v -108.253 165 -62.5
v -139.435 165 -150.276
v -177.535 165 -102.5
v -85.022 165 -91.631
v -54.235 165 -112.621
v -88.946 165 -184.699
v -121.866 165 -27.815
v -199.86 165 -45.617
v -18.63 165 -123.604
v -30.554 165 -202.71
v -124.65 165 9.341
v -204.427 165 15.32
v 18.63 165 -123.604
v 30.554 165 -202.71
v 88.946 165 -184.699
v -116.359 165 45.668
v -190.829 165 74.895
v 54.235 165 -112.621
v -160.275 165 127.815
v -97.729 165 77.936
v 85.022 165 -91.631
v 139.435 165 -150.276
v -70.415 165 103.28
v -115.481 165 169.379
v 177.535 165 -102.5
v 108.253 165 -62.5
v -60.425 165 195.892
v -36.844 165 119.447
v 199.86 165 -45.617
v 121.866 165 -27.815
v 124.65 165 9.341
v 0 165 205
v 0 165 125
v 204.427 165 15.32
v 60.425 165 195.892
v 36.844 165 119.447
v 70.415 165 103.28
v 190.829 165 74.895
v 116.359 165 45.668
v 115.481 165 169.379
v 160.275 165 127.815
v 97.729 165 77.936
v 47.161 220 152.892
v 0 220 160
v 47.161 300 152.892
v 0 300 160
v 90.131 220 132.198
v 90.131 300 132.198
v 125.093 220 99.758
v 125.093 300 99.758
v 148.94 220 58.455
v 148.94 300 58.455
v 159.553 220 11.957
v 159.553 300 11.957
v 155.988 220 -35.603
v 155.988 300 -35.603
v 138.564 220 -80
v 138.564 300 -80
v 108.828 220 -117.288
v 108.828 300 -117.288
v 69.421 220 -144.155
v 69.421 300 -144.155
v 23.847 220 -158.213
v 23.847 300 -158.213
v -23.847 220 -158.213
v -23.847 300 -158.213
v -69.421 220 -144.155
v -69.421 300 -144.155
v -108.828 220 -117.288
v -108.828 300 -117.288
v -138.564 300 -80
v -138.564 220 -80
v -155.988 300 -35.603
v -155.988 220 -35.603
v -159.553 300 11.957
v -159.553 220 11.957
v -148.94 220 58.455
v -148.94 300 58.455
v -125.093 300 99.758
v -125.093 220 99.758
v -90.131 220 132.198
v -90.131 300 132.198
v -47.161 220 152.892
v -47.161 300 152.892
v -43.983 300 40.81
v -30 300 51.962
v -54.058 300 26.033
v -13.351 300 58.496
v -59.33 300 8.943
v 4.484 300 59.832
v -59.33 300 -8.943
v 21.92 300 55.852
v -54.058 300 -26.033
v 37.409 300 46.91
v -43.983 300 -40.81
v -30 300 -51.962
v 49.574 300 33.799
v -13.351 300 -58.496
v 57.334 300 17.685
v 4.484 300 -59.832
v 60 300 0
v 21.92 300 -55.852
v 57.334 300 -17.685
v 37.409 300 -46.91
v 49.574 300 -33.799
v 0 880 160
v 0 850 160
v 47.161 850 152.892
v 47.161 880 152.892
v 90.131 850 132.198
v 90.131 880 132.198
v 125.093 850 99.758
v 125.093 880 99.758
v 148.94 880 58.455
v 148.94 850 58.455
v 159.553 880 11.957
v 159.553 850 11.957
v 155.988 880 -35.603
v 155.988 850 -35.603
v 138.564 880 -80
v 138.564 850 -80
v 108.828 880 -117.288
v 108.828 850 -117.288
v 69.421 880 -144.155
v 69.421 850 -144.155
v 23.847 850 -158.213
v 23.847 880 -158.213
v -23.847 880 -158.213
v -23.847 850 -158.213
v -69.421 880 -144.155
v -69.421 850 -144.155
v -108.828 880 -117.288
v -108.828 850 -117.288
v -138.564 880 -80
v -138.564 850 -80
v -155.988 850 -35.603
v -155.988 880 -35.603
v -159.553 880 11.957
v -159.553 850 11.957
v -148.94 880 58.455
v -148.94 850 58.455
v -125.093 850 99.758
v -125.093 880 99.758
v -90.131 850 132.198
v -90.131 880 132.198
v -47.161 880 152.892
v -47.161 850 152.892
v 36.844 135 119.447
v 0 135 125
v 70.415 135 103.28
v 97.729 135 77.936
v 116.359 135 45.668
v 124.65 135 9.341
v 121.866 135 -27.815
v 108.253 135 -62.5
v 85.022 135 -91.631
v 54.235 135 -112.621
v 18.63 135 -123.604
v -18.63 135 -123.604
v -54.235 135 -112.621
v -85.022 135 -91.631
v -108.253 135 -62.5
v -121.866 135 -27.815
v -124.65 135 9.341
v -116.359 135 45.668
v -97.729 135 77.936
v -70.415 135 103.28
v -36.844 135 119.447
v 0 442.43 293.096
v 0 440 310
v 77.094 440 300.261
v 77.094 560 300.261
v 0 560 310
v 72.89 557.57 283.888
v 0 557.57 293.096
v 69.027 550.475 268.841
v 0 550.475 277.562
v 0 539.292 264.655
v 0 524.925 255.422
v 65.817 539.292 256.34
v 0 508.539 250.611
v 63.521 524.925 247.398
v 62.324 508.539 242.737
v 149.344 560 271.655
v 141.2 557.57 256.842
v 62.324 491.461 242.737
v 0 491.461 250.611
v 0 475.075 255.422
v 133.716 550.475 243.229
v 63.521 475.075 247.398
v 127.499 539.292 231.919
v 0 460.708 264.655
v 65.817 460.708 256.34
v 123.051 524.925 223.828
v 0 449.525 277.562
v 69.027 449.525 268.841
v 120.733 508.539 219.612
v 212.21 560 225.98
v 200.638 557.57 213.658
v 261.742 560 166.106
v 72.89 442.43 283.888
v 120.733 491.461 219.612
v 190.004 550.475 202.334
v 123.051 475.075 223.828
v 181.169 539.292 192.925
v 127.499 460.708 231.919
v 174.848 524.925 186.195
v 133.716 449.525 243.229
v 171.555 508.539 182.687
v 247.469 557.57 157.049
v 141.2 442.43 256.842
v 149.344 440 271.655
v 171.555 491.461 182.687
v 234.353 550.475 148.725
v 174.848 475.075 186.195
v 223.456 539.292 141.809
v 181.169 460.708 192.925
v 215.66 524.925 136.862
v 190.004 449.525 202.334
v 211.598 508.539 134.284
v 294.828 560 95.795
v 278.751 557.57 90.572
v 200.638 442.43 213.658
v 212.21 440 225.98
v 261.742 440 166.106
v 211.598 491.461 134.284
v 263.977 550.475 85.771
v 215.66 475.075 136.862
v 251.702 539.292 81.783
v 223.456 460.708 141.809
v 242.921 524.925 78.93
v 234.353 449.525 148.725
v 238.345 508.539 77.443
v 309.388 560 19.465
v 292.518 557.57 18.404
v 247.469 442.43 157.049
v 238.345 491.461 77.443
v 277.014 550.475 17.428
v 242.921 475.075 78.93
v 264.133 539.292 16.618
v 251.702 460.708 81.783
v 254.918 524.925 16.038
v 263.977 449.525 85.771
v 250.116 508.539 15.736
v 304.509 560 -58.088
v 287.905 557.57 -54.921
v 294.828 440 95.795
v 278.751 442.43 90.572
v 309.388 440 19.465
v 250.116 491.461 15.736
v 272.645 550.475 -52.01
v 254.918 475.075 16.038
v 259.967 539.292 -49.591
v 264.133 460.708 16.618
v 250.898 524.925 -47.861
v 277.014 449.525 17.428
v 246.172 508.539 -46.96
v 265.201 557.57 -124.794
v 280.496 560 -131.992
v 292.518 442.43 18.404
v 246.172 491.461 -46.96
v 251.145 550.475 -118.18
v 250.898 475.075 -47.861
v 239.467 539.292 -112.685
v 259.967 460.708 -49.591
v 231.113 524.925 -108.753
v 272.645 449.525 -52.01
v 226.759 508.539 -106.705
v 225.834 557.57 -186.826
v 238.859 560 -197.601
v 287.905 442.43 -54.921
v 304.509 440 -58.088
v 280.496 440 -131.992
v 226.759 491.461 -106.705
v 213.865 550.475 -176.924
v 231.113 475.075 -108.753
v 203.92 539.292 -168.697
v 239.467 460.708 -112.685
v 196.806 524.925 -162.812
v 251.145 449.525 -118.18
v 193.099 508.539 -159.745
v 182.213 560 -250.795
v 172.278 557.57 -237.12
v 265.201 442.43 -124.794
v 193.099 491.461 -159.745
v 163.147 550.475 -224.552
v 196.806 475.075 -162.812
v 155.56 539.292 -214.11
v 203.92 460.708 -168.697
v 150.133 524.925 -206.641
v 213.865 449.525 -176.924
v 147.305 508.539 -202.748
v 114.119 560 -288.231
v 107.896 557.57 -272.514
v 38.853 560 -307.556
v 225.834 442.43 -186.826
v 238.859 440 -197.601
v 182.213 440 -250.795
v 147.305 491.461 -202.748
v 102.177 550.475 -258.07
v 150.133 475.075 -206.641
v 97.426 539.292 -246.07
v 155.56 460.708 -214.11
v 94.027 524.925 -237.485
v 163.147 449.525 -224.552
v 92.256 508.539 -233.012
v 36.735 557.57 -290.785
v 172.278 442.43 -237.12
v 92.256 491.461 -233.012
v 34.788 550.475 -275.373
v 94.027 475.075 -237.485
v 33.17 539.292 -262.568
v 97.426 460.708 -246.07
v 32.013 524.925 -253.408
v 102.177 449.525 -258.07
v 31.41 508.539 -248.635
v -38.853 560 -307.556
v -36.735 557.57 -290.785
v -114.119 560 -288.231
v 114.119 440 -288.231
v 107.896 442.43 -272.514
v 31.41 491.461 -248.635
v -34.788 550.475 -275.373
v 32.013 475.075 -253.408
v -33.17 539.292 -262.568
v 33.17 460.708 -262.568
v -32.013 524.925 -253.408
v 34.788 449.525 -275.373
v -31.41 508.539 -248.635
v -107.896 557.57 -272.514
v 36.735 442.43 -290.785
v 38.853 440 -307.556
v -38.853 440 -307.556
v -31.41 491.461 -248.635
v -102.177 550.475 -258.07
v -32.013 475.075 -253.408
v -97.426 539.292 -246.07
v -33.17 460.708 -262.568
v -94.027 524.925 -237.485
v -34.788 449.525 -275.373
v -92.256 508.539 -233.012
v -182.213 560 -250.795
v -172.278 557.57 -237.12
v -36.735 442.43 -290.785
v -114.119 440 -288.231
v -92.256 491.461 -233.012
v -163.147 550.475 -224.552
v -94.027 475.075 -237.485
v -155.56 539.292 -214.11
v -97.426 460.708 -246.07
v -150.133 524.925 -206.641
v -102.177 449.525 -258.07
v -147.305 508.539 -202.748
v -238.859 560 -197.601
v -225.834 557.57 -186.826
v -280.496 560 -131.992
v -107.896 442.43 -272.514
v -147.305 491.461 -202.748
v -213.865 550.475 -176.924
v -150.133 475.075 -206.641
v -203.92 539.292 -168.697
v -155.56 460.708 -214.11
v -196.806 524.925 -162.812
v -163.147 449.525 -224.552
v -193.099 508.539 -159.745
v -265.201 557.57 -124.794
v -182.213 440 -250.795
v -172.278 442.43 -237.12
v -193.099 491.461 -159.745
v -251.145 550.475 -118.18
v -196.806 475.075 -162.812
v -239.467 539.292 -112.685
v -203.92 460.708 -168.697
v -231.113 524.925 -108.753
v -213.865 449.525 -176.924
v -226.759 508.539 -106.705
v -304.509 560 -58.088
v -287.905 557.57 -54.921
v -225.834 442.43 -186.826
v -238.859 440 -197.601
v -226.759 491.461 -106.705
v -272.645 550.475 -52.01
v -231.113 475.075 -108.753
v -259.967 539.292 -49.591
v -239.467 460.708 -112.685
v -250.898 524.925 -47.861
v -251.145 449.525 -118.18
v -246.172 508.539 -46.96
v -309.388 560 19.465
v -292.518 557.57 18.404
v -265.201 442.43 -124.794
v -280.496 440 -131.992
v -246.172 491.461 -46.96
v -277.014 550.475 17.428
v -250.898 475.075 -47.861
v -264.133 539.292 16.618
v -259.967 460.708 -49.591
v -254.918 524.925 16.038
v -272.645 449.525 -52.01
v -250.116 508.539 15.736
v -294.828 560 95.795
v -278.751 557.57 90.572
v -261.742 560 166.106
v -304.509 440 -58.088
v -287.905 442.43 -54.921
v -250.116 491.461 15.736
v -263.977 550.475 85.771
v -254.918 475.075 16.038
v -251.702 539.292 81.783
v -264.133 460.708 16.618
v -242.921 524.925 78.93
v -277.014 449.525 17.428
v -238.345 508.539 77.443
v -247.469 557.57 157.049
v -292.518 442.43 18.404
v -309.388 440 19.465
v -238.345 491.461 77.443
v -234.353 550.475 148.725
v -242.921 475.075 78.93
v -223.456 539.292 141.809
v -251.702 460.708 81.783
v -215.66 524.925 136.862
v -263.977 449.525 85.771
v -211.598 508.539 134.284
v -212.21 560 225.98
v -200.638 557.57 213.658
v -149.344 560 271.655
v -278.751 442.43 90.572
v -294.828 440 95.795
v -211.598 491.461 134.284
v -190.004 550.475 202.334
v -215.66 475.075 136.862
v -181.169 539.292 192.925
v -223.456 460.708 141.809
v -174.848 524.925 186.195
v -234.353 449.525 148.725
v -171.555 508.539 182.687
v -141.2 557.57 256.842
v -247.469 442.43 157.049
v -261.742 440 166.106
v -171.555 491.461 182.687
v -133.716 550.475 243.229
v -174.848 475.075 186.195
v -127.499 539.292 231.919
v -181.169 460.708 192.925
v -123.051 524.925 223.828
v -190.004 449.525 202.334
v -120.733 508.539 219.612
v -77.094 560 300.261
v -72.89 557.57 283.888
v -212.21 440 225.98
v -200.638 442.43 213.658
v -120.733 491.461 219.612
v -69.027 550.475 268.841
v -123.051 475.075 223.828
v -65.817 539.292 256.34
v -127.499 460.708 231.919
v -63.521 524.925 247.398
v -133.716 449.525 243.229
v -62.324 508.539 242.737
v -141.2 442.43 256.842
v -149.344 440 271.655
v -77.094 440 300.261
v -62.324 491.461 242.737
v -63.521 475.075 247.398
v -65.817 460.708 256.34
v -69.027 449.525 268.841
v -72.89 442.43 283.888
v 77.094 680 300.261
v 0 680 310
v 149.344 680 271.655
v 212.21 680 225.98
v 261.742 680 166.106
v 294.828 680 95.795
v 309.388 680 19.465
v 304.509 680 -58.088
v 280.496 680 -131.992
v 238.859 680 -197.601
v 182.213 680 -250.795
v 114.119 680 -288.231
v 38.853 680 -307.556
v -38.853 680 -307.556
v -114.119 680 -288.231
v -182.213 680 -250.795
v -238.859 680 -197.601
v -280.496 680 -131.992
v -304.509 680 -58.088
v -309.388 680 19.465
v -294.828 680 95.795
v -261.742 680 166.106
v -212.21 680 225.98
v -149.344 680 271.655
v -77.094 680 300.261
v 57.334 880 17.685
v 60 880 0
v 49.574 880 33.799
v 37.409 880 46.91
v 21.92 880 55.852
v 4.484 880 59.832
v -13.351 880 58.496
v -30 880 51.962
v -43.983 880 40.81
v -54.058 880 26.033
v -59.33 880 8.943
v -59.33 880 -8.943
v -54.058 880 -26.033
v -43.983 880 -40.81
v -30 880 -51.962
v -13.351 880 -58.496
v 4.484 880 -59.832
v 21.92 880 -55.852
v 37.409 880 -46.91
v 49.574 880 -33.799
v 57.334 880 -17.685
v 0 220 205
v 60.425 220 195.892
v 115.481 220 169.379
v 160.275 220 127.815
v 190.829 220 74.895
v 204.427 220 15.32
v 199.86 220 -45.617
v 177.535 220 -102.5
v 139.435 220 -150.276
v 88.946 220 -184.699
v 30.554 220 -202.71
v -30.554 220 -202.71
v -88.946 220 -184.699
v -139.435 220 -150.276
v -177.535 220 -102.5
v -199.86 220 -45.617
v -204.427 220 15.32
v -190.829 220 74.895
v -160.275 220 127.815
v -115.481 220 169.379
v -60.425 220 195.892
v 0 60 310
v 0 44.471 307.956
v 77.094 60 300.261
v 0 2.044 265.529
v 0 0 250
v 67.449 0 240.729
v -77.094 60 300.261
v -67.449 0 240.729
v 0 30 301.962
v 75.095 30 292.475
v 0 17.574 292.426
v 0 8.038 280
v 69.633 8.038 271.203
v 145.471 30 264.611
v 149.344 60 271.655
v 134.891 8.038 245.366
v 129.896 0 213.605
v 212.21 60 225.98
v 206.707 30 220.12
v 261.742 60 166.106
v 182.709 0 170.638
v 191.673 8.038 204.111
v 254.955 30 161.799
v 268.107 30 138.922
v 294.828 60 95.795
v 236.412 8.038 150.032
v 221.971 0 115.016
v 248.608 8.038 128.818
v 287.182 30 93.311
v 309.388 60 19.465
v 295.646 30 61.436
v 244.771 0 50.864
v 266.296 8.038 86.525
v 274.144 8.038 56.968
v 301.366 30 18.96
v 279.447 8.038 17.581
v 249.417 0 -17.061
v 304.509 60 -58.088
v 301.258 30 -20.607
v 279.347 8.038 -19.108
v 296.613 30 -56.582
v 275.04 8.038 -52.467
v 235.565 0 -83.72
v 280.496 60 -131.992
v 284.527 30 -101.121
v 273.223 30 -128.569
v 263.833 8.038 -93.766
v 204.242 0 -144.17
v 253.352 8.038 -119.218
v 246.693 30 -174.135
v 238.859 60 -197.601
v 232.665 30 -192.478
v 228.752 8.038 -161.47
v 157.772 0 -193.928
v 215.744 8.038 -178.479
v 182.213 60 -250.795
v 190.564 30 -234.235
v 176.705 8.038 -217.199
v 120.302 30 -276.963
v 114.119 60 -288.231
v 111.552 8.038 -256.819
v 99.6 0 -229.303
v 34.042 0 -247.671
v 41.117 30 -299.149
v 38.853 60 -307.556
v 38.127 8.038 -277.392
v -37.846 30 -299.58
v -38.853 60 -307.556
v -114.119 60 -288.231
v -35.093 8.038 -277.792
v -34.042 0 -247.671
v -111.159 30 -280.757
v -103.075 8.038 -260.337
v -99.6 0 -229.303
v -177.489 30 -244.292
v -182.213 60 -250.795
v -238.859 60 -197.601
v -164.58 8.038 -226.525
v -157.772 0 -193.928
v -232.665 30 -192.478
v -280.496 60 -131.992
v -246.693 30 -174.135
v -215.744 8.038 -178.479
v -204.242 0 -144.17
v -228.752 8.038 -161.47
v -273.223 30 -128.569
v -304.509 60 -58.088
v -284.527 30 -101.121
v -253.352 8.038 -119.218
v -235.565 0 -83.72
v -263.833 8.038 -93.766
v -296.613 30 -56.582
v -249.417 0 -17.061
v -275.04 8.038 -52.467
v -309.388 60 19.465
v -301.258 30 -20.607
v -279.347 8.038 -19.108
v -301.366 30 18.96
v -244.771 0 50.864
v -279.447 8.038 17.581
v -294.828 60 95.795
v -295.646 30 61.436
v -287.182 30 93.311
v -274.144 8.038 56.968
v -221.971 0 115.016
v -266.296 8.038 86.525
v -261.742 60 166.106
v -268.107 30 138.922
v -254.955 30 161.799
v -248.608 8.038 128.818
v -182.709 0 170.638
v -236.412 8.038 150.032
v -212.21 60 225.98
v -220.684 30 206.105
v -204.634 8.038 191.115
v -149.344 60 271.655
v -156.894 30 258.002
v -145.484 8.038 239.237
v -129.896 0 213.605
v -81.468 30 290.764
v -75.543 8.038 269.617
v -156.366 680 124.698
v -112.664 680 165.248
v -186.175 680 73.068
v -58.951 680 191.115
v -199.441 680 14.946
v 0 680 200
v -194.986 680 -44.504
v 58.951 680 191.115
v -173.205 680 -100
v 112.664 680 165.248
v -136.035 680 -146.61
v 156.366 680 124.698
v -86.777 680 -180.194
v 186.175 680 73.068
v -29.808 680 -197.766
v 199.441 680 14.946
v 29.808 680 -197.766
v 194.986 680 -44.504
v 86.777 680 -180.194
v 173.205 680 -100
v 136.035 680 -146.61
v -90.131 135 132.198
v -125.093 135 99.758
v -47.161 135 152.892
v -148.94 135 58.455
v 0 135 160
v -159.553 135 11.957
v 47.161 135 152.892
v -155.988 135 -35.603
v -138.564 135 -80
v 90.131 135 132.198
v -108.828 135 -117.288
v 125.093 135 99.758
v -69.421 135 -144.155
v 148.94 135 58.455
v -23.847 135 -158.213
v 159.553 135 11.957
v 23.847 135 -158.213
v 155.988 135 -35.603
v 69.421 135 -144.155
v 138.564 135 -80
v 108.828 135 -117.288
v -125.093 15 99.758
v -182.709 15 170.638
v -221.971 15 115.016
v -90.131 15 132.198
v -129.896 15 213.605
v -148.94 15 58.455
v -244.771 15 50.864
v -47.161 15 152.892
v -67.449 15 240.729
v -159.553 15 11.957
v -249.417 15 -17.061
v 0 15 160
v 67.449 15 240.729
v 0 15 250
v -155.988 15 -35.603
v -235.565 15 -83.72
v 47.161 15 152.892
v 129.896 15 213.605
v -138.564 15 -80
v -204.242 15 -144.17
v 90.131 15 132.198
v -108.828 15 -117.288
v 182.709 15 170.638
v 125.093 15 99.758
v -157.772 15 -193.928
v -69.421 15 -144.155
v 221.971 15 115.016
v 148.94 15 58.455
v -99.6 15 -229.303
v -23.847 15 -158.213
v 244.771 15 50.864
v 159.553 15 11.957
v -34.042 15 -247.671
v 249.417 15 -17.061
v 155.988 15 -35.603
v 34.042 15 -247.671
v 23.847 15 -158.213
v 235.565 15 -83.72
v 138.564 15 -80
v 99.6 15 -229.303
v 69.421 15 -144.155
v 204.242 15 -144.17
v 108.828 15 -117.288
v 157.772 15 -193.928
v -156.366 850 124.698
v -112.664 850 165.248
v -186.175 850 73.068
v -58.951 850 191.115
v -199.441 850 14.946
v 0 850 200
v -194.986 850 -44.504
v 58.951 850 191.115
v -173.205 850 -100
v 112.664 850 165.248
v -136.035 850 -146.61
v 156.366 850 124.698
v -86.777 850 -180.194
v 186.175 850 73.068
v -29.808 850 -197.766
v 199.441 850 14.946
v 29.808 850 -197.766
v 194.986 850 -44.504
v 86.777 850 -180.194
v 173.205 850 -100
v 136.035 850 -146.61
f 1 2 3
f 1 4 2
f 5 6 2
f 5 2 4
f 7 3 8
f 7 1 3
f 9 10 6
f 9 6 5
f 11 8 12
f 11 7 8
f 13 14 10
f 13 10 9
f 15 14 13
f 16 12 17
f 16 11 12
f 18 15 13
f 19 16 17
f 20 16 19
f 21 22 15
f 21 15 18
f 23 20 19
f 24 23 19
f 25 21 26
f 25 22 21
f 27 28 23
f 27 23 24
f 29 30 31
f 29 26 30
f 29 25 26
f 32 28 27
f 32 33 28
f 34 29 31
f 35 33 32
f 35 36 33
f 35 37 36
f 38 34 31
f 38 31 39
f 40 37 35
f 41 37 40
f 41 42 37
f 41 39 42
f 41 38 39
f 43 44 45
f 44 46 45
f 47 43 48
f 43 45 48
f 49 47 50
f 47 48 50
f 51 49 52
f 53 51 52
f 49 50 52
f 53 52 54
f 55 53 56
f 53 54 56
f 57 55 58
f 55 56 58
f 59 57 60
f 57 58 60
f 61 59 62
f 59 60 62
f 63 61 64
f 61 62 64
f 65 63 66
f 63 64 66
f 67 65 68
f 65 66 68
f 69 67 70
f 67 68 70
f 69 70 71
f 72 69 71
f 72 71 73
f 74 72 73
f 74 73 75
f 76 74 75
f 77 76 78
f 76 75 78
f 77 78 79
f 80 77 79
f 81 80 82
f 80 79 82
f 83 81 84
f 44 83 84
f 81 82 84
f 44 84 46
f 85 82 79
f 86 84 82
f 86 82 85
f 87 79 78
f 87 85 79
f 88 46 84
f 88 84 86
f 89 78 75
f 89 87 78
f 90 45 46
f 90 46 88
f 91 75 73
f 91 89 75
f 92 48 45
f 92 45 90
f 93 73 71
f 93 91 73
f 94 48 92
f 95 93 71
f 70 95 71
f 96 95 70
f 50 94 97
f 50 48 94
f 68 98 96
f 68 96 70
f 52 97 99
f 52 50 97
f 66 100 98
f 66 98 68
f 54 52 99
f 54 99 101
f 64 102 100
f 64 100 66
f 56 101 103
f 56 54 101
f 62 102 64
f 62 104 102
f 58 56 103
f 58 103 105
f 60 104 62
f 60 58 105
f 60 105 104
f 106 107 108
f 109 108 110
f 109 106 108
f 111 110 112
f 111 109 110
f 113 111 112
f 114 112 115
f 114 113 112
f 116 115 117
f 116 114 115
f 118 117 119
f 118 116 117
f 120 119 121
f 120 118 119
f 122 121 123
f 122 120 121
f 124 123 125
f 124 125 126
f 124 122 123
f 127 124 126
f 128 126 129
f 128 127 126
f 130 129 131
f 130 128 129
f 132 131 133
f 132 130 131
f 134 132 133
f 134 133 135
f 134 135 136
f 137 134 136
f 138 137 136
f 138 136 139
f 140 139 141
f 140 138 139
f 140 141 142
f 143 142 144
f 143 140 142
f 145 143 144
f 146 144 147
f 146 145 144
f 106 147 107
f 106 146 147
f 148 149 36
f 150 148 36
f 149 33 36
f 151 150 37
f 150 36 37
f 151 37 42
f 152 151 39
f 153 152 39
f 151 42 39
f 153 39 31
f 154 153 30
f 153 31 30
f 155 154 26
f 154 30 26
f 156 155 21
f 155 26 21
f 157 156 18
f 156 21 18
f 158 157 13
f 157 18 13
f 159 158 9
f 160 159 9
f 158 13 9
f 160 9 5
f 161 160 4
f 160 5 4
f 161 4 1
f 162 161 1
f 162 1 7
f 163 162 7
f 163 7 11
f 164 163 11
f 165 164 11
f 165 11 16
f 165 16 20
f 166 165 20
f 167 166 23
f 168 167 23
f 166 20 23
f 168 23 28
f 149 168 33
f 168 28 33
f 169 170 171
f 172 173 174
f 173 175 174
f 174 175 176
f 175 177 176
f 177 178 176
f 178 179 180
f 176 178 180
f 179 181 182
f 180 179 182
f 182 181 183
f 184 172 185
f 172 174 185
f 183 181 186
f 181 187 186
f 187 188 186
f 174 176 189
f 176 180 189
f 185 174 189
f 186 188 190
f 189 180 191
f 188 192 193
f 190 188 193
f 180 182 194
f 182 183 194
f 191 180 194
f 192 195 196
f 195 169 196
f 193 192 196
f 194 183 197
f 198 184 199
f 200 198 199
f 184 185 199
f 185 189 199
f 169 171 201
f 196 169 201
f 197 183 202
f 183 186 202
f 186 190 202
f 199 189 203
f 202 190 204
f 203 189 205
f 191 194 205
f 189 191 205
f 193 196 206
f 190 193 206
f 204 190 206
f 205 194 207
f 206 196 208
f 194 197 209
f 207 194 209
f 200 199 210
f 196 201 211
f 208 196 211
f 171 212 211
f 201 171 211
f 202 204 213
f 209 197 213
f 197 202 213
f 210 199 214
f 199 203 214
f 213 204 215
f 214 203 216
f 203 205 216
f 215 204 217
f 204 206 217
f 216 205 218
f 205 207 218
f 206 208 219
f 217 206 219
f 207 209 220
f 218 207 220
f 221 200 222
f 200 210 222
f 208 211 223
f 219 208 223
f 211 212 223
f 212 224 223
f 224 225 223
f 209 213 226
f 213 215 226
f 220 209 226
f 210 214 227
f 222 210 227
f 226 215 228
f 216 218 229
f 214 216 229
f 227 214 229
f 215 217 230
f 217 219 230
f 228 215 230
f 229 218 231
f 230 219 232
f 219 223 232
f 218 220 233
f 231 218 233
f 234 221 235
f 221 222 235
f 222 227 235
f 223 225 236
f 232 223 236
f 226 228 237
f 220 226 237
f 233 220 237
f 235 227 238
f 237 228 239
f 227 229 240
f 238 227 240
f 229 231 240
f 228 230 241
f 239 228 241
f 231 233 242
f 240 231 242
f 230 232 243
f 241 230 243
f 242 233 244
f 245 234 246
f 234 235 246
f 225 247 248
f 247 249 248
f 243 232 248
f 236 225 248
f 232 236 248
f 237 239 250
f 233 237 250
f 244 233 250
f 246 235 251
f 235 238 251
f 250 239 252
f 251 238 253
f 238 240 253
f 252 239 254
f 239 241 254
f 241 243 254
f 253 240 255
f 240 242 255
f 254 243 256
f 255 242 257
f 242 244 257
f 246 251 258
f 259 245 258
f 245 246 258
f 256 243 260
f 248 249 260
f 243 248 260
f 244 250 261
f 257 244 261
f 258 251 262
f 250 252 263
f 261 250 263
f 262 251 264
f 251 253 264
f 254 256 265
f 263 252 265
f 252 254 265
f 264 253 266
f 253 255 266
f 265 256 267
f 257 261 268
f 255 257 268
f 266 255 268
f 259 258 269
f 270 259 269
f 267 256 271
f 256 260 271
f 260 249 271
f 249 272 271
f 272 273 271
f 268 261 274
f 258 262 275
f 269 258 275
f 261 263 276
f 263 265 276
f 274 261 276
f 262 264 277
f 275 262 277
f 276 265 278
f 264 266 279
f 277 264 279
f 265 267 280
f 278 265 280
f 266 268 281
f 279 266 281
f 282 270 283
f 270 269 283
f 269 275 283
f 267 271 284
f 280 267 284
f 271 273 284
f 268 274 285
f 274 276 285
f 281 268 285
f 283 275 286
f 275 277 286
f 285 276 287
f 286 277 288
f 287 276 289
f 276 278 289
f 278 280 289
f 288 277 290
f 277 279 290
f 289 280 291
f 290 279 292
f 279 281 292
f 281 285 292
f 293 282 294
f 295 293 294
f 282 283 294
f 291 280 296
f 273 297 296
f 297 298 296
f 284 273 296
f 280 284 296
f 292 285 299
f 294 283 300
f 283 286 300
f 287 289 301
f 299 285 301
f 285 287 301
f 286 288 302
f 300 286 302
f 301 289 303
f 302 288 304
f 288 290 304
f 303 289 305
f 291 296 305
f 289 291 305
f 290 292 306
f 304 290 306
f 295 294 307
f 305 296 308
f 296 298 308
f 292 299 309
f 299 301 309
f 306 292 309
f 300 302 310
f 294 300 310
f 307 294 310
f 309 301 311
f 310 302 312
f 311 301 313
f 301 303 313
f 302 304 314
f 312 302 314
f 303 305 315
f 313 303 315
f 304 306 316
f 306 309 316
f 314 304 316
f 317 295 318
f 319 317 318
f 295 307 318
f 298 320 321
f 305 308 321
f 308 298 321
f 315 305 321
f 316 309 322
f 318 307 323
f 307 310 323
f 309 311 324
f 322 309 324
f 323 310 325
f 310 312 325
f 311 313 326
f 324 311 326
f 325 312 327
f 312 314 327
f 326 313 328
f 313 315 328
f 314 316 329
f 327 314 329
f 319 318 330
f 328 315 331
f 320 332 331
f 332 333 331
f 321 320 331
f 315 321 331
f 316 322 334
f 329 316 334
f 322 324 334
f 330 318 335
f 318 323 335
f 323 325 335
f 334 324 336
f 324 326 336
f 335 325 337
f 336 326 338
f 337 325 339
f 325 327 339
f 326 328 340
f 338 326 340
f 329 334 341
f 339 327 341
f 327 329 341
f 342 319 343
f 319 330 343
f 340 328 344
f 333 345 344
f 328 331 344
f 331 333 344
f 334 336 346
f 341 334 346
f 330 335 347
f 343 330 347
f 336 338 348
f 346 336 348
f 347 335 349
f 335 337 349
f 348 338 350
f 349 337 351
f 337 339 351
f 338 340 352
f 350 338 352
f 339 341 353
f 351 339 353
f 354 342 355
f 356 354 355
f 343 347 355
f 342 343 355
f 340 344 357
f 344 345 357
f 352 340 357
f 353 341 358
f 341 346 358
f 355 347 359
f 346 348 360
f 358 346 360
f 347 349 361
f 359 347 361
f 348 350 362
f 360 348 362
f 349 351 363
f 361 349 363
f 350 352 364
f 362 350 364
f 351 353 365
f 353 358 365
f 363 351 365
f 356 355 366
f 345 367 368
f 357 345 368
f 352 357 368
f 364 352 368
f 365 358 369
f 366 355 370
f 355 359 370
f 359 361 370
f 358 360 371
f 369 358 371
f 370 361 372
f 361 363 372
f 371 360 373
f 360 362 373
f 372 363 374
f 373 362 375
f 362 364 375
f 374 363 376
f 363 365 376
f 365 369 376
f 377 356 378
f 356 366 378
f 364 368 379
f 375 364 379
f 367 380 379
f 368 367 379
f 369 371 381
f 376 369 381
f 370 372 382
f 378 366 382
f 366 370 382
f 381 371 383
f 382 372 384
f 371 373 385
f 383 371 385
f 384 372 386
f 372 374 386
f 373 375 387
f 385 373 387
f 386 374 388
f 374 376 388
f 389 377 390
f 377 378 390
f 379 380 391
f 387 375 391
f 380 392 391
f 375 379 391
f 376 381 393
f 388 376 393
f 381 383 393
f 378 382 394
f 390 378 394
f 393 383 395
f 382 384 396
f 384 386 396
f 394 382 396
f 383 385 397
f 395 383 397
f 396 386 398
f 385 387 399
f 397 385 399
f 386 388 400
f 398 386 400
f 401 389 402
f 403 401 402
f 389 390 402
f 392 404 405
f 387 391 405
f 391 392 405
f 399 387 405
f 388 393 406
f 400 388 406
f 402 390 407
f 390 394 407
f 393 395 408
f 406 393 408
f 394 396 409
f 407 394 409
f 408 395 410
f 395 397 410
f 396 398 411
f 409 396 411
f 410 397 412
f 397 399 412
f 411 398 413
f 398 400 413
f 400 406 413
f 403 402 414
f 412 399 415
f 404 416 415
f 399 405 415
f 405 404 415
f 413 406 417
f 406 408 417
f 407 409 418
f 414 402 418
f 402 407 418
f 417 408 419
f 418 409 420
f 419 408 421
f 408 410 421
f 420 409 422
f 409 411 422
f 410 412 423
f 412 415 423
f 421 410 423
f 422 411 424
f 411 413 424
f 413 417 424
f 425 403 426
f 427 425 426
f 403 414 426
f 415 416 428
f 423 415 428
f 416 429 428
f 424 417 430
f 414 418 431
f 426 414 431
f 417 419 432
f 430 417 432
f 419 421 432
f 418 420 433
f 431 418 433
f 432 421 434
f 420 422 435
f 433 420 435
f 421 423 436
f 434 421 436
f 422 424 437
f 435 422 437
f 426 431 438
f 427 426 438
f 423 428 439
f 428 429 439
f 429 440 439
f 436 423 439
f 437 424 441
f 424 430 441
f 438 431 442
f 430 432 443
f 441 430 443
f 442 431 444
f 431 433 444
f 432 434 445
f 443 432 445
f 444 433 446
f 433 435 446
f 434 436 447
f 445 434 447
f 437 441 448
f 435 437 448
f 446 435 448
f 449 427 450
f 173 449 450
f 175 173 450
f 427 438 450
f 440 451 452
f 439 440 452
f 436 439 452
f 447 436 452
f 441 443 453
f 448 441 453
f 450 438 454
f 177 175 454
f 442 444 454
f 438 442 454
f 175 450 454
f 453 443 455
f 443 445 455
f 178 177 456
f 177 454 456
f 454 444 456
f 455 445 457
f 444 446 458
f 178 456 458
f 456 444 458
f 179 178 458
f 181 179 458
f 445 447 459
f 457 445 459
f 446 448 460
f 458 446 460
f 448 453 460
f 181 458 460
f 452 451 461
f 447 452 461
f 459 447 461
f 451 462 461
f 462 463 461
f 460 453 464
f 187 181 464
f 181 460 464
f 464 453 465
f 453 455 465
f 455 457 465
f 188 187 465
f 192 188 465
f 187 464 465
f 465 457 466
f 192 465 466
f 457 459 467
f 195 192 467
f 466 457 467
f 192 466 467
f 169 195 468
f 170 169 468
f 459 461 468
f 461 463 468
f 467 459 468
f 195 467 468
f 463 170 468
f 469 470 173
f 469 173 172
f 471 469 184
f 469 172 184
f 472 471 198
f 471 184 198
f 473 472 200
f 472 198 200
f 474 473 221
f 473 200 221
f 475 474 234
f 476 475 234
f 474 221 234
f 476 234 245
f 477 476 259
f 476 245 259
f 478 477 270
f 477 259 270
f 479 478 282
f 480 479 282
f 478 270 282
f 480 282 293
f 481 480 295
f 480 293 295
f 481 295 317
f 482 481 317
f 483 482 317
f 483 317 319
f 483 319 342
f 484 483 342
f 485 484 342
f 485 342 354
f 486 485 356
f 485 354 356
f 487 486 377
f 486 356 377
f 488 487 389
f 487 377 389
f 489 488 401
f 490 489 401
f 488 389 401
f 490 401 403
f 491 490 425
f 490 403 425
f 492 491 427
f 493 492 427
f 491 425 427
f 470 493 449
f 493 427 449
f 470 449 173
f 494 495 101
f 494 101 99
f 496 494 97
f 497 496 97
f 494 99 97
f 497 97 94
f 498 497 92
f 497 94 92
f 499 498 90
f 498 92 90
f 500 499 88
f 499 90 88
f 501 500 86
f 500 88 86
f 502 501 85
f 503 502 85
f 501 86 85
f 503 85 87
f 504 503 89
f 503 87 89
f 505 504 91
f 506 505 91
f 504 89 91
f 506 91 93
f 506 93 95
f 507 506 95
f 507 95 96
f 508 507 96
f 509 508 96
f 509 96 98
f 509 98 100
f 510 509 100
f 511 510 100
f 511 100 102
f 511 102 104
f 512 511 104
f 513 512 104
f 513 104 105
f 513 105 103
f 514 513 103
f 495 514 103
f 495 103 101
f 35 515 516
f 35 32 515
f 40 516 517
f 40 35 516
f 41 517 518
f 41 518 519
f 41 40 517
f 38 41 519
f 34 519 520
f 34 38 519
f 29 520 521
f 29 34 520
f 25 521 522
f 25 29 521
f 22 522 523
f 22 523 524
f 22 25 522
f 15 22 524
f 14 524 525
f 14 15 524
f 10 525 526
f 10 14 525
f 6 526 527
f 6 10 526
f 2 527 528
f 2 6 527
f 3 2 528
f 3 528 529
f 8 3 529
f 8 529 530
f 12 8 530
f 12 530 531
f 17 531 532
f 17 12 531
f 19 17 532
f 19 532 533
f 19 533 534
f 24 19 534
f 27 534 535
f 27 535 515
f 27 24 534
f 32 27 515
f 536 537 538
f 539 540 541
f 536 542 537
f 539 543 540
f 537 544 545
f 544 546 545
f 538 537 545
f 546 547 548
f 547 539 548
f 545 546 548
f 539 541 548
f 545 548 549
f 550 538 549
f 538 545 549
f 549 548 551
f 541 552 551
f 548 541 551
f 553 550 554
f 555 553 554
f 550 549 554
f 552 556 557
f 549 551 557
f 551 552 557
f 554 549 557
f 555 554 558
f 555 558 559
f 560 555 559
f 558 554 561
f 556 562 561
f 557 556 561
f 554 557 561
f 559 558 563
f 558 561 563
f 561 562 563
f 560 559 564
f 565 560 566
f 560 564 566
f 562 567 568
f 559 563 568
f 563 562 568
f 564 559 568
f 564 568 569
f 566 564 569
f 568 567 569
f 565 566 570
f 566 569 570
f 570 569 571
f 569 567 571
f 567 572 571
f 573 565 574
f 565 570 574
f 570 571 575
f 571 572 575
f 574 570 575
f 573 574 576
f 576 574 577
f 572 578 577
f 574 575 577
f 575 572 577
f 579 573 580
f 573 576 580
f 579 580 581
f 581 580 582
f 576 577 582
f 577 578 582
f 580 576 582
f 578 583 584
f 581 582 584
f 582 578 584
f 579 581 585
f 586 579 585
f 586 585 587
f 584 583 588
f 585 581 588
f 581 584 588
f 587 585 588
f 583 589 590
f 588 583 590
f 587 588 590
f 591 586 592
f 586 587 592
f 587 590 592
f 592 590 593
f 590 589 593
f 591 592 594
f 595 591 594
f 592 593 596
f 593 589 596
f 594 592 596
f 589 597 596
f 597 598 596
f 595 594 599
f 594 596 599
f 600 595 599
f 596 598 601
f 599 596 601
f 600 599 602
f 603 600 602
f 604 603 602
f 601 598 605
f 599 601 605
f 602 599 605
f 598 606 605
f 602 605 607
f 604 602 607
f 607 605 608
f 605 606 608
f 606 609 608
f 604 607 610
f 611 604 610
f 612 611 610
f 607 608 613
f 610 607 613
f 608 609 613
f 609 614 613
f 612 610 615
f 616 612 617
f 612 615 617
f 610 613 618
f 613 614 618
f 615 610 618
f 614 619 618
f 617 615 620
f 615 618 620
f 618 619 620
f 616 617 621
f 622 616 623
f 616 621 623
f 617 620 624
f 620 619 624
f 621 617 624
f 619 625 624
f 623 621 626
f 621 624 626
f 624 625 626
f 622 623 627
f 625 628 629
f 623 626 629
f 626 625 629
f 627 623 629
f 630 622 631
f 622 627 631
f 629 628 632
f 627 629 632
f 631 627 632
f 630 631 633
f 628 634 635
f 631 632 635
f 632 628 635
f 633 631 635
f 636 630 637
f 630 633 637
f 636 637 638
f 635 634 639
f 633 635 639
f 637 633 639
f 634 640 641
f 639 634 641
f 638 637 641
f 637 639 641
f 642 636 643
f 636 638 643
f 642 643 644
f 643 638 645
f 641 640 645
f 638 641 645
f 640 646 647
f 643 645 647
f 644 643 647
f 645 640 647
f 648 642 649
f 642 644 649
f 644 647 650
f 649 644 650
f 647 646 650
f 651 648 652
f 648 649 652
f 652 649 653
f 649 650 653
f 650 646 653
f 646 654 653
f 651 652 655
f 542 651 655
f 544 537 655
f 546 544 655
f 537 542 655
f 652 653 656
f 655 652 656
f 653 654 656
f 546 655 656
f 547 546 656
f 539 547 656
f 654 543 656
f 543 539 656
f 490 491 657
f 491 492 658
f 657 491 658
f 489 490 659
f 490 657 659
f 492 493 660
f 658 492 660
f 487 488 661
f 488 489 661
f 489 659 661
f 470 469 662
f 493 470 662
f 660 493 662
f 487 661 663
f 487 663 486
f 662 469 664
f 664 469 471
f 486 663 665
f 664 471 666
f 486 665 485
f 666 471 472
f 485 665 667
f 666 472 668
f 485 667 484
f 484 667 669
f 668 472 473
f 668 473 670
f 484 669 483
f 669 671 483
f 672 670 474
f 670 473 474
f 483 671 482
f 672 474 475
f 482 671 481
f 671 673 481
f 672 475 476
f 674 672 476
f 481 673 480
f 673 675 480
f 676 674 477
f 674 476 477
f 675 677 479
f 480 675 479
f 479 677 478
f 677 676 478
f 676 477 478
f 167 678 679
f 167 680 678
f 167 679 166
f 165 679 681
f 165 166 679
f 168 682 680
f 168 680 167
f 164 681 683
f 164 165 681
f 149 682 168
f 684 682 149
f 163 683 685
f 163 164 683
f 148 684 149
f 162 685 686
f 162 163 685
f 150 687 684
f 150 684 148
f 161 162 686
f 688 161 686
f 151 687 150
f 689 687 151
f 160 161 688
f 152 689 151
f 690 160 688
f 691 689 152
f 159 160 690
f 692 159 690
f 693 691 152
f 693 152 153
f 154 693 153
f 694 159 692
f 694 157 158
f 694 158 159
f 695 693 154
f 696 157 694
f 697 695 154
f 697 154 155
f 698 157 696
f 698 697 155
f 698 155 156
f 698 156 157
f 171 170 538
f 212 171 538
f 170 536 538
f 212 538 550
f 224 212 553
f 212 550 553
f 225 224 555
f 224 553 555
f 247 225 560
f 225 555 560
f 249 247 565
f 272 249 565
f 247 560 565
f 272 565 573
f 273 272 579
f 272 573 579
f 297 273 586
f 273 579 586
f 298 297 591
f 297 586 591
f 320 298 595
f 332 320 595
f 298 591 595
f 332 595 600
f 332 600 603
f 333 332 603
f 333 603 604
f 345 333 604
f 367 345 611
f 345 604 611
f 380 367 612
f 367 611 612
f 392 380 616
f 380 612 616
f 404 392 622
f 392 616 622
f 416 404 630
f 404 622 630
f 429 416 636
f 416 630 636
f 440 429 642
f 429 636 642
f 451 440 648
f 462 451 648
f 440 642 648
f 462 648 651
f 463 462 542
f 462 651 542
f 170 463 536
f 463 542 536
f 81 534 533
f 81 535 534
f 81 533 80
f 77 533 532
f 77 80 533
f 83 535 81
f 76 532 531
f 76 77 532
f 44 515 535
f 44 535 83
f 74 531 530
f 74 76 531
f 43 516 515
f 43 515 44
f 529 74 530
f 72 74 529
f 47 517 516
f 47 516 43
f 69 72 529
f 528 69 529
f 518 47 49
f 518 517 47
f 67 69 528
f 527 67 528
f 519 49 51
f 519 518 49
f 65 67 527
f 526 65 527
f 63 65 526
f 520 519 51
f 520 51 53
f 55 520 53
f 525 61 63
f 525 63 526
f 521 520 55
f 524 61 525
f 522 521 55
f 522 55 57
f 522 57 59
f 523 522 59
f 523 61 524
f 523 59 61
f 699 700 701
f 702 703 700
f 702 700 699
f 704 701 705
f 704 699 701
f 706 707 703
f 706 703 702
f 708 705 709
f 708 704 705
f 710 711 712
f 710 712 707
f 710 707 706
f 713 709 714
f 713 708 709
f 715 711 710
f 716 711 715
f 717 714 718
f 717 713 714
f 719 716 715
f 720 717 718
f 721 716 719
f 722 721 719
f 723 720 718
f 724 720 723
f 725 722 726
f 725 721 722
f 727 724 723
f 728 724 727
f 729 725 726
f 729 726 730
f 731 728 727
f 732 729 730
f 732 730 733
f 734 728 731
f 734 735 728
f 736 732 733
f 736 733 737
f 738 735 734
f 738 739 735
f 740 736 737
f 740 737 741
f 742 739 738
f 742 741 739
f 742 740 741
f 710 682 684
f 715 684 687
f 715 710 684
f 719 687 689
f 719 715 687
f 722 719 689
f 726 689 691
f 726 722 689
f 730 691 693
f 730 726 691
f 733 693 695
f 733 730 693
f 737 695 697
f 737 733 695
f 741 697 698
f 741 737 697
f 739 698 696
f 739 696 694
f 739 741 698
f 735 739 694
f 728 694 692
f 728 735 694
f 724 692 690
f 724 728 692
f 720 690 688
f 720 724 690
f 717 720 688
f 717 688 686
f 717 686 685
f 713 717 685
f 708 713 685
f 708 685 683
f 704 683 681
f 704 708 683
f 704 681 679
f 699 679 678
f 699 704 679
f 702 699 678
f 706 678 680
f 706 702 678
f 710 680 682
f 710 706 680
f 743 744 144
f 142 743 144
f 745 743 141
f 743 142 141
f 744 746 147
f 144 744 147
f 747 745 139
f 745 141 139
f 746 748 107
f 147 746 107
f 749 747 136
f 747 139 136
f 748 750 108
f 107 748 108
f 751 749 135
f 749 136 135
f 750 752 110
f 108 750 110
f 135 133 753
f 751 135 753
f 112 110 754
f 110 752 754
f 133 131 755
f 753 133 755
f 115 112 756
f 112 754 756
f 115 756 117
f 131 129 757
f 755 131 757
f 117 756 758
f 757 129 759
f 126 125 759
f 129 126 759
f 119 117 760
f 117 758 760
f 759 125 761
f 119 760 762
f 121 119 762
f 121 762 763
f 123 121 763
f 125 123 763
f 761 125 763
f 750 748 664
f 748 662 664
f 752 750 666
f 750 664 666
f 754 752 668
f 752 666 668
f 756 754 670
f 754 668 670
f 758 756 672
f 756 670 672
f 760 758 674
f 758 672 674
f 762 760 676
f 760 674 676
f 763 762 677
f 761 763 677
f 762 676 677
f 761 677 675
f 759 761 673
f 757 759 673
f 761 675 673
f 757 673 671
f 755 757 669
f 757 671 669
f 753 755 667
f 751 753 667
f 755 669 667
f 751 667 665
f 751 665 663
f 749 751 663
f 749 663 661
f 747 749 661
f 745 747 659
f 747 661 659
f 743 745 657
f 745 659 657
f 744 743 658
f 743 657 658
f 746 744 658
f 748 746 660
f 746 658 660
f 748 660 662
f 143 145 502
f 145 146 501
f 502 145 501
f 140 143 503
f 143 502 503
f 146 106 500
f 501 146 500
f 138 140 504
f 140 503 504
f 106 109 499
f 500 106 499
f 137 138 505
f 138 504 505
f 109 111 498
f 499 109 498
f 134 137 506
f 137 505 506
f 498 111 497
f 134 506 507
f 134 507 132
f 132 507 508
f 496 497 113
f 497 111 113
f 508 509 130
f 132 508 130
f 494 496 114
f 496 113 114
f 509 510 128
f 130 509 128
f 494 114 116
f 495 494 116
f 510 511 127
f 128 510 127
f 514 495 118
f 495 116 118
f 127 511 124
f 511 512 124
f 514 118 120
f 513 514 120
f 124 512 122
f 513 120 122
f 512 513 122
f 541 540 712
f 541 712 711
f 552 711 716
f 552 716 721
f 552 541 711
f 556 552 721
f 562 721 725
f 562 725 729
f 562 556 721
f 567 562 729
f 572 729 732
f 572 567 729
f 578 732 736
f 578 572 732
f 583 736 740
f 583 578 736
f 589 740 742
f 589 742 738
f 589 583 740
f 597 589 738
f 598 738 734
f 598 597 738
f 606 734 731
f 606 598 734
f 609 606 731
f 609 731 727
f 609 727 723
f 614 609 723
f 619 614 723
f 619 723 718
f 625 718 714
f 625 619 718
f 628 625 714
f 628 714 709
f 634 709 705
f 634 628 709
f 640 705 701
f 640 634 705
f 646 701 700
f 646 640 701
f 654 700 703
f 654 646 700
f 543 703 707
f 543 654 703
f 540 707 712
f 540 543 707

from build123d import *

# Parameters (mm, degrees)
F0_W     = 30
F0_H     = 160
F2_W     = 30
F2_H     = 125
F2_W_2   = 80
F2_H_2   = 160
F4_R     = 60
F5_DEPTH = 580.001


with BuildPart() as f1:
    # F0 (on Right) → F1 (revolve)
    with BuildSketch(Plane.YZ):
        with BuildLine():
            Line((0, 250), (0, 0))
            Line((0, 0), (680, 0))
            Line((680, 0), (680, 200))
            Line((680, 200), (680, 310))
            Line((680, 310), (560, 310))
            ThreePointArc((560, 310), (500, 250), (440, 310))
            Line((440, 310), (60, 310))
            ThreePointArc((60, 310), (17.573593, 292.426407), (0, 250))
        make_face()
        Polygon((680, 200), (680, 0), (850, 0), (850, 160), (850, 200), align=None)
        with Locations((865, 80)):
            Rectangle(F0_W, F0_H)
    revolve(axis=Axis((0, 440, 0), (0, 1, 0)))

    # F2 (on Right) → F3 (revolve, cut)
    with BuildSketch(Plane.YZ):
        Polygon((0, 250), (0, 0), (15, 0), (15, 160), (15, 250), align=None)
        Polygon((15, 160), (15, 0), (135, 0), (135, 125), (135, 160), align=None)
        with Locations((150, 62.5)):
            Rectangle(F2_W, F2_H)
        Polygon((165, 125), (165, 0), (220, 0), (220, 160), (220, 205), (165, 205), align=None)
        with Locations((260, 80)):
            Rectangle(F2_W_2, F2_H_2)
    revolve(axis=Axis((0, 192.5, 0), (0, 1, 0)), mode=Mode.SUBTRACT)

    # F4 (on face) → F5 (cut, through all)
    with BuildSketch(Plane.XZ.offset(-300)):
        Circle(F4_R)
    extrude(amount=-F5_DEPTH, mode=Mode.SUBTRACT)


solid = f1.part
